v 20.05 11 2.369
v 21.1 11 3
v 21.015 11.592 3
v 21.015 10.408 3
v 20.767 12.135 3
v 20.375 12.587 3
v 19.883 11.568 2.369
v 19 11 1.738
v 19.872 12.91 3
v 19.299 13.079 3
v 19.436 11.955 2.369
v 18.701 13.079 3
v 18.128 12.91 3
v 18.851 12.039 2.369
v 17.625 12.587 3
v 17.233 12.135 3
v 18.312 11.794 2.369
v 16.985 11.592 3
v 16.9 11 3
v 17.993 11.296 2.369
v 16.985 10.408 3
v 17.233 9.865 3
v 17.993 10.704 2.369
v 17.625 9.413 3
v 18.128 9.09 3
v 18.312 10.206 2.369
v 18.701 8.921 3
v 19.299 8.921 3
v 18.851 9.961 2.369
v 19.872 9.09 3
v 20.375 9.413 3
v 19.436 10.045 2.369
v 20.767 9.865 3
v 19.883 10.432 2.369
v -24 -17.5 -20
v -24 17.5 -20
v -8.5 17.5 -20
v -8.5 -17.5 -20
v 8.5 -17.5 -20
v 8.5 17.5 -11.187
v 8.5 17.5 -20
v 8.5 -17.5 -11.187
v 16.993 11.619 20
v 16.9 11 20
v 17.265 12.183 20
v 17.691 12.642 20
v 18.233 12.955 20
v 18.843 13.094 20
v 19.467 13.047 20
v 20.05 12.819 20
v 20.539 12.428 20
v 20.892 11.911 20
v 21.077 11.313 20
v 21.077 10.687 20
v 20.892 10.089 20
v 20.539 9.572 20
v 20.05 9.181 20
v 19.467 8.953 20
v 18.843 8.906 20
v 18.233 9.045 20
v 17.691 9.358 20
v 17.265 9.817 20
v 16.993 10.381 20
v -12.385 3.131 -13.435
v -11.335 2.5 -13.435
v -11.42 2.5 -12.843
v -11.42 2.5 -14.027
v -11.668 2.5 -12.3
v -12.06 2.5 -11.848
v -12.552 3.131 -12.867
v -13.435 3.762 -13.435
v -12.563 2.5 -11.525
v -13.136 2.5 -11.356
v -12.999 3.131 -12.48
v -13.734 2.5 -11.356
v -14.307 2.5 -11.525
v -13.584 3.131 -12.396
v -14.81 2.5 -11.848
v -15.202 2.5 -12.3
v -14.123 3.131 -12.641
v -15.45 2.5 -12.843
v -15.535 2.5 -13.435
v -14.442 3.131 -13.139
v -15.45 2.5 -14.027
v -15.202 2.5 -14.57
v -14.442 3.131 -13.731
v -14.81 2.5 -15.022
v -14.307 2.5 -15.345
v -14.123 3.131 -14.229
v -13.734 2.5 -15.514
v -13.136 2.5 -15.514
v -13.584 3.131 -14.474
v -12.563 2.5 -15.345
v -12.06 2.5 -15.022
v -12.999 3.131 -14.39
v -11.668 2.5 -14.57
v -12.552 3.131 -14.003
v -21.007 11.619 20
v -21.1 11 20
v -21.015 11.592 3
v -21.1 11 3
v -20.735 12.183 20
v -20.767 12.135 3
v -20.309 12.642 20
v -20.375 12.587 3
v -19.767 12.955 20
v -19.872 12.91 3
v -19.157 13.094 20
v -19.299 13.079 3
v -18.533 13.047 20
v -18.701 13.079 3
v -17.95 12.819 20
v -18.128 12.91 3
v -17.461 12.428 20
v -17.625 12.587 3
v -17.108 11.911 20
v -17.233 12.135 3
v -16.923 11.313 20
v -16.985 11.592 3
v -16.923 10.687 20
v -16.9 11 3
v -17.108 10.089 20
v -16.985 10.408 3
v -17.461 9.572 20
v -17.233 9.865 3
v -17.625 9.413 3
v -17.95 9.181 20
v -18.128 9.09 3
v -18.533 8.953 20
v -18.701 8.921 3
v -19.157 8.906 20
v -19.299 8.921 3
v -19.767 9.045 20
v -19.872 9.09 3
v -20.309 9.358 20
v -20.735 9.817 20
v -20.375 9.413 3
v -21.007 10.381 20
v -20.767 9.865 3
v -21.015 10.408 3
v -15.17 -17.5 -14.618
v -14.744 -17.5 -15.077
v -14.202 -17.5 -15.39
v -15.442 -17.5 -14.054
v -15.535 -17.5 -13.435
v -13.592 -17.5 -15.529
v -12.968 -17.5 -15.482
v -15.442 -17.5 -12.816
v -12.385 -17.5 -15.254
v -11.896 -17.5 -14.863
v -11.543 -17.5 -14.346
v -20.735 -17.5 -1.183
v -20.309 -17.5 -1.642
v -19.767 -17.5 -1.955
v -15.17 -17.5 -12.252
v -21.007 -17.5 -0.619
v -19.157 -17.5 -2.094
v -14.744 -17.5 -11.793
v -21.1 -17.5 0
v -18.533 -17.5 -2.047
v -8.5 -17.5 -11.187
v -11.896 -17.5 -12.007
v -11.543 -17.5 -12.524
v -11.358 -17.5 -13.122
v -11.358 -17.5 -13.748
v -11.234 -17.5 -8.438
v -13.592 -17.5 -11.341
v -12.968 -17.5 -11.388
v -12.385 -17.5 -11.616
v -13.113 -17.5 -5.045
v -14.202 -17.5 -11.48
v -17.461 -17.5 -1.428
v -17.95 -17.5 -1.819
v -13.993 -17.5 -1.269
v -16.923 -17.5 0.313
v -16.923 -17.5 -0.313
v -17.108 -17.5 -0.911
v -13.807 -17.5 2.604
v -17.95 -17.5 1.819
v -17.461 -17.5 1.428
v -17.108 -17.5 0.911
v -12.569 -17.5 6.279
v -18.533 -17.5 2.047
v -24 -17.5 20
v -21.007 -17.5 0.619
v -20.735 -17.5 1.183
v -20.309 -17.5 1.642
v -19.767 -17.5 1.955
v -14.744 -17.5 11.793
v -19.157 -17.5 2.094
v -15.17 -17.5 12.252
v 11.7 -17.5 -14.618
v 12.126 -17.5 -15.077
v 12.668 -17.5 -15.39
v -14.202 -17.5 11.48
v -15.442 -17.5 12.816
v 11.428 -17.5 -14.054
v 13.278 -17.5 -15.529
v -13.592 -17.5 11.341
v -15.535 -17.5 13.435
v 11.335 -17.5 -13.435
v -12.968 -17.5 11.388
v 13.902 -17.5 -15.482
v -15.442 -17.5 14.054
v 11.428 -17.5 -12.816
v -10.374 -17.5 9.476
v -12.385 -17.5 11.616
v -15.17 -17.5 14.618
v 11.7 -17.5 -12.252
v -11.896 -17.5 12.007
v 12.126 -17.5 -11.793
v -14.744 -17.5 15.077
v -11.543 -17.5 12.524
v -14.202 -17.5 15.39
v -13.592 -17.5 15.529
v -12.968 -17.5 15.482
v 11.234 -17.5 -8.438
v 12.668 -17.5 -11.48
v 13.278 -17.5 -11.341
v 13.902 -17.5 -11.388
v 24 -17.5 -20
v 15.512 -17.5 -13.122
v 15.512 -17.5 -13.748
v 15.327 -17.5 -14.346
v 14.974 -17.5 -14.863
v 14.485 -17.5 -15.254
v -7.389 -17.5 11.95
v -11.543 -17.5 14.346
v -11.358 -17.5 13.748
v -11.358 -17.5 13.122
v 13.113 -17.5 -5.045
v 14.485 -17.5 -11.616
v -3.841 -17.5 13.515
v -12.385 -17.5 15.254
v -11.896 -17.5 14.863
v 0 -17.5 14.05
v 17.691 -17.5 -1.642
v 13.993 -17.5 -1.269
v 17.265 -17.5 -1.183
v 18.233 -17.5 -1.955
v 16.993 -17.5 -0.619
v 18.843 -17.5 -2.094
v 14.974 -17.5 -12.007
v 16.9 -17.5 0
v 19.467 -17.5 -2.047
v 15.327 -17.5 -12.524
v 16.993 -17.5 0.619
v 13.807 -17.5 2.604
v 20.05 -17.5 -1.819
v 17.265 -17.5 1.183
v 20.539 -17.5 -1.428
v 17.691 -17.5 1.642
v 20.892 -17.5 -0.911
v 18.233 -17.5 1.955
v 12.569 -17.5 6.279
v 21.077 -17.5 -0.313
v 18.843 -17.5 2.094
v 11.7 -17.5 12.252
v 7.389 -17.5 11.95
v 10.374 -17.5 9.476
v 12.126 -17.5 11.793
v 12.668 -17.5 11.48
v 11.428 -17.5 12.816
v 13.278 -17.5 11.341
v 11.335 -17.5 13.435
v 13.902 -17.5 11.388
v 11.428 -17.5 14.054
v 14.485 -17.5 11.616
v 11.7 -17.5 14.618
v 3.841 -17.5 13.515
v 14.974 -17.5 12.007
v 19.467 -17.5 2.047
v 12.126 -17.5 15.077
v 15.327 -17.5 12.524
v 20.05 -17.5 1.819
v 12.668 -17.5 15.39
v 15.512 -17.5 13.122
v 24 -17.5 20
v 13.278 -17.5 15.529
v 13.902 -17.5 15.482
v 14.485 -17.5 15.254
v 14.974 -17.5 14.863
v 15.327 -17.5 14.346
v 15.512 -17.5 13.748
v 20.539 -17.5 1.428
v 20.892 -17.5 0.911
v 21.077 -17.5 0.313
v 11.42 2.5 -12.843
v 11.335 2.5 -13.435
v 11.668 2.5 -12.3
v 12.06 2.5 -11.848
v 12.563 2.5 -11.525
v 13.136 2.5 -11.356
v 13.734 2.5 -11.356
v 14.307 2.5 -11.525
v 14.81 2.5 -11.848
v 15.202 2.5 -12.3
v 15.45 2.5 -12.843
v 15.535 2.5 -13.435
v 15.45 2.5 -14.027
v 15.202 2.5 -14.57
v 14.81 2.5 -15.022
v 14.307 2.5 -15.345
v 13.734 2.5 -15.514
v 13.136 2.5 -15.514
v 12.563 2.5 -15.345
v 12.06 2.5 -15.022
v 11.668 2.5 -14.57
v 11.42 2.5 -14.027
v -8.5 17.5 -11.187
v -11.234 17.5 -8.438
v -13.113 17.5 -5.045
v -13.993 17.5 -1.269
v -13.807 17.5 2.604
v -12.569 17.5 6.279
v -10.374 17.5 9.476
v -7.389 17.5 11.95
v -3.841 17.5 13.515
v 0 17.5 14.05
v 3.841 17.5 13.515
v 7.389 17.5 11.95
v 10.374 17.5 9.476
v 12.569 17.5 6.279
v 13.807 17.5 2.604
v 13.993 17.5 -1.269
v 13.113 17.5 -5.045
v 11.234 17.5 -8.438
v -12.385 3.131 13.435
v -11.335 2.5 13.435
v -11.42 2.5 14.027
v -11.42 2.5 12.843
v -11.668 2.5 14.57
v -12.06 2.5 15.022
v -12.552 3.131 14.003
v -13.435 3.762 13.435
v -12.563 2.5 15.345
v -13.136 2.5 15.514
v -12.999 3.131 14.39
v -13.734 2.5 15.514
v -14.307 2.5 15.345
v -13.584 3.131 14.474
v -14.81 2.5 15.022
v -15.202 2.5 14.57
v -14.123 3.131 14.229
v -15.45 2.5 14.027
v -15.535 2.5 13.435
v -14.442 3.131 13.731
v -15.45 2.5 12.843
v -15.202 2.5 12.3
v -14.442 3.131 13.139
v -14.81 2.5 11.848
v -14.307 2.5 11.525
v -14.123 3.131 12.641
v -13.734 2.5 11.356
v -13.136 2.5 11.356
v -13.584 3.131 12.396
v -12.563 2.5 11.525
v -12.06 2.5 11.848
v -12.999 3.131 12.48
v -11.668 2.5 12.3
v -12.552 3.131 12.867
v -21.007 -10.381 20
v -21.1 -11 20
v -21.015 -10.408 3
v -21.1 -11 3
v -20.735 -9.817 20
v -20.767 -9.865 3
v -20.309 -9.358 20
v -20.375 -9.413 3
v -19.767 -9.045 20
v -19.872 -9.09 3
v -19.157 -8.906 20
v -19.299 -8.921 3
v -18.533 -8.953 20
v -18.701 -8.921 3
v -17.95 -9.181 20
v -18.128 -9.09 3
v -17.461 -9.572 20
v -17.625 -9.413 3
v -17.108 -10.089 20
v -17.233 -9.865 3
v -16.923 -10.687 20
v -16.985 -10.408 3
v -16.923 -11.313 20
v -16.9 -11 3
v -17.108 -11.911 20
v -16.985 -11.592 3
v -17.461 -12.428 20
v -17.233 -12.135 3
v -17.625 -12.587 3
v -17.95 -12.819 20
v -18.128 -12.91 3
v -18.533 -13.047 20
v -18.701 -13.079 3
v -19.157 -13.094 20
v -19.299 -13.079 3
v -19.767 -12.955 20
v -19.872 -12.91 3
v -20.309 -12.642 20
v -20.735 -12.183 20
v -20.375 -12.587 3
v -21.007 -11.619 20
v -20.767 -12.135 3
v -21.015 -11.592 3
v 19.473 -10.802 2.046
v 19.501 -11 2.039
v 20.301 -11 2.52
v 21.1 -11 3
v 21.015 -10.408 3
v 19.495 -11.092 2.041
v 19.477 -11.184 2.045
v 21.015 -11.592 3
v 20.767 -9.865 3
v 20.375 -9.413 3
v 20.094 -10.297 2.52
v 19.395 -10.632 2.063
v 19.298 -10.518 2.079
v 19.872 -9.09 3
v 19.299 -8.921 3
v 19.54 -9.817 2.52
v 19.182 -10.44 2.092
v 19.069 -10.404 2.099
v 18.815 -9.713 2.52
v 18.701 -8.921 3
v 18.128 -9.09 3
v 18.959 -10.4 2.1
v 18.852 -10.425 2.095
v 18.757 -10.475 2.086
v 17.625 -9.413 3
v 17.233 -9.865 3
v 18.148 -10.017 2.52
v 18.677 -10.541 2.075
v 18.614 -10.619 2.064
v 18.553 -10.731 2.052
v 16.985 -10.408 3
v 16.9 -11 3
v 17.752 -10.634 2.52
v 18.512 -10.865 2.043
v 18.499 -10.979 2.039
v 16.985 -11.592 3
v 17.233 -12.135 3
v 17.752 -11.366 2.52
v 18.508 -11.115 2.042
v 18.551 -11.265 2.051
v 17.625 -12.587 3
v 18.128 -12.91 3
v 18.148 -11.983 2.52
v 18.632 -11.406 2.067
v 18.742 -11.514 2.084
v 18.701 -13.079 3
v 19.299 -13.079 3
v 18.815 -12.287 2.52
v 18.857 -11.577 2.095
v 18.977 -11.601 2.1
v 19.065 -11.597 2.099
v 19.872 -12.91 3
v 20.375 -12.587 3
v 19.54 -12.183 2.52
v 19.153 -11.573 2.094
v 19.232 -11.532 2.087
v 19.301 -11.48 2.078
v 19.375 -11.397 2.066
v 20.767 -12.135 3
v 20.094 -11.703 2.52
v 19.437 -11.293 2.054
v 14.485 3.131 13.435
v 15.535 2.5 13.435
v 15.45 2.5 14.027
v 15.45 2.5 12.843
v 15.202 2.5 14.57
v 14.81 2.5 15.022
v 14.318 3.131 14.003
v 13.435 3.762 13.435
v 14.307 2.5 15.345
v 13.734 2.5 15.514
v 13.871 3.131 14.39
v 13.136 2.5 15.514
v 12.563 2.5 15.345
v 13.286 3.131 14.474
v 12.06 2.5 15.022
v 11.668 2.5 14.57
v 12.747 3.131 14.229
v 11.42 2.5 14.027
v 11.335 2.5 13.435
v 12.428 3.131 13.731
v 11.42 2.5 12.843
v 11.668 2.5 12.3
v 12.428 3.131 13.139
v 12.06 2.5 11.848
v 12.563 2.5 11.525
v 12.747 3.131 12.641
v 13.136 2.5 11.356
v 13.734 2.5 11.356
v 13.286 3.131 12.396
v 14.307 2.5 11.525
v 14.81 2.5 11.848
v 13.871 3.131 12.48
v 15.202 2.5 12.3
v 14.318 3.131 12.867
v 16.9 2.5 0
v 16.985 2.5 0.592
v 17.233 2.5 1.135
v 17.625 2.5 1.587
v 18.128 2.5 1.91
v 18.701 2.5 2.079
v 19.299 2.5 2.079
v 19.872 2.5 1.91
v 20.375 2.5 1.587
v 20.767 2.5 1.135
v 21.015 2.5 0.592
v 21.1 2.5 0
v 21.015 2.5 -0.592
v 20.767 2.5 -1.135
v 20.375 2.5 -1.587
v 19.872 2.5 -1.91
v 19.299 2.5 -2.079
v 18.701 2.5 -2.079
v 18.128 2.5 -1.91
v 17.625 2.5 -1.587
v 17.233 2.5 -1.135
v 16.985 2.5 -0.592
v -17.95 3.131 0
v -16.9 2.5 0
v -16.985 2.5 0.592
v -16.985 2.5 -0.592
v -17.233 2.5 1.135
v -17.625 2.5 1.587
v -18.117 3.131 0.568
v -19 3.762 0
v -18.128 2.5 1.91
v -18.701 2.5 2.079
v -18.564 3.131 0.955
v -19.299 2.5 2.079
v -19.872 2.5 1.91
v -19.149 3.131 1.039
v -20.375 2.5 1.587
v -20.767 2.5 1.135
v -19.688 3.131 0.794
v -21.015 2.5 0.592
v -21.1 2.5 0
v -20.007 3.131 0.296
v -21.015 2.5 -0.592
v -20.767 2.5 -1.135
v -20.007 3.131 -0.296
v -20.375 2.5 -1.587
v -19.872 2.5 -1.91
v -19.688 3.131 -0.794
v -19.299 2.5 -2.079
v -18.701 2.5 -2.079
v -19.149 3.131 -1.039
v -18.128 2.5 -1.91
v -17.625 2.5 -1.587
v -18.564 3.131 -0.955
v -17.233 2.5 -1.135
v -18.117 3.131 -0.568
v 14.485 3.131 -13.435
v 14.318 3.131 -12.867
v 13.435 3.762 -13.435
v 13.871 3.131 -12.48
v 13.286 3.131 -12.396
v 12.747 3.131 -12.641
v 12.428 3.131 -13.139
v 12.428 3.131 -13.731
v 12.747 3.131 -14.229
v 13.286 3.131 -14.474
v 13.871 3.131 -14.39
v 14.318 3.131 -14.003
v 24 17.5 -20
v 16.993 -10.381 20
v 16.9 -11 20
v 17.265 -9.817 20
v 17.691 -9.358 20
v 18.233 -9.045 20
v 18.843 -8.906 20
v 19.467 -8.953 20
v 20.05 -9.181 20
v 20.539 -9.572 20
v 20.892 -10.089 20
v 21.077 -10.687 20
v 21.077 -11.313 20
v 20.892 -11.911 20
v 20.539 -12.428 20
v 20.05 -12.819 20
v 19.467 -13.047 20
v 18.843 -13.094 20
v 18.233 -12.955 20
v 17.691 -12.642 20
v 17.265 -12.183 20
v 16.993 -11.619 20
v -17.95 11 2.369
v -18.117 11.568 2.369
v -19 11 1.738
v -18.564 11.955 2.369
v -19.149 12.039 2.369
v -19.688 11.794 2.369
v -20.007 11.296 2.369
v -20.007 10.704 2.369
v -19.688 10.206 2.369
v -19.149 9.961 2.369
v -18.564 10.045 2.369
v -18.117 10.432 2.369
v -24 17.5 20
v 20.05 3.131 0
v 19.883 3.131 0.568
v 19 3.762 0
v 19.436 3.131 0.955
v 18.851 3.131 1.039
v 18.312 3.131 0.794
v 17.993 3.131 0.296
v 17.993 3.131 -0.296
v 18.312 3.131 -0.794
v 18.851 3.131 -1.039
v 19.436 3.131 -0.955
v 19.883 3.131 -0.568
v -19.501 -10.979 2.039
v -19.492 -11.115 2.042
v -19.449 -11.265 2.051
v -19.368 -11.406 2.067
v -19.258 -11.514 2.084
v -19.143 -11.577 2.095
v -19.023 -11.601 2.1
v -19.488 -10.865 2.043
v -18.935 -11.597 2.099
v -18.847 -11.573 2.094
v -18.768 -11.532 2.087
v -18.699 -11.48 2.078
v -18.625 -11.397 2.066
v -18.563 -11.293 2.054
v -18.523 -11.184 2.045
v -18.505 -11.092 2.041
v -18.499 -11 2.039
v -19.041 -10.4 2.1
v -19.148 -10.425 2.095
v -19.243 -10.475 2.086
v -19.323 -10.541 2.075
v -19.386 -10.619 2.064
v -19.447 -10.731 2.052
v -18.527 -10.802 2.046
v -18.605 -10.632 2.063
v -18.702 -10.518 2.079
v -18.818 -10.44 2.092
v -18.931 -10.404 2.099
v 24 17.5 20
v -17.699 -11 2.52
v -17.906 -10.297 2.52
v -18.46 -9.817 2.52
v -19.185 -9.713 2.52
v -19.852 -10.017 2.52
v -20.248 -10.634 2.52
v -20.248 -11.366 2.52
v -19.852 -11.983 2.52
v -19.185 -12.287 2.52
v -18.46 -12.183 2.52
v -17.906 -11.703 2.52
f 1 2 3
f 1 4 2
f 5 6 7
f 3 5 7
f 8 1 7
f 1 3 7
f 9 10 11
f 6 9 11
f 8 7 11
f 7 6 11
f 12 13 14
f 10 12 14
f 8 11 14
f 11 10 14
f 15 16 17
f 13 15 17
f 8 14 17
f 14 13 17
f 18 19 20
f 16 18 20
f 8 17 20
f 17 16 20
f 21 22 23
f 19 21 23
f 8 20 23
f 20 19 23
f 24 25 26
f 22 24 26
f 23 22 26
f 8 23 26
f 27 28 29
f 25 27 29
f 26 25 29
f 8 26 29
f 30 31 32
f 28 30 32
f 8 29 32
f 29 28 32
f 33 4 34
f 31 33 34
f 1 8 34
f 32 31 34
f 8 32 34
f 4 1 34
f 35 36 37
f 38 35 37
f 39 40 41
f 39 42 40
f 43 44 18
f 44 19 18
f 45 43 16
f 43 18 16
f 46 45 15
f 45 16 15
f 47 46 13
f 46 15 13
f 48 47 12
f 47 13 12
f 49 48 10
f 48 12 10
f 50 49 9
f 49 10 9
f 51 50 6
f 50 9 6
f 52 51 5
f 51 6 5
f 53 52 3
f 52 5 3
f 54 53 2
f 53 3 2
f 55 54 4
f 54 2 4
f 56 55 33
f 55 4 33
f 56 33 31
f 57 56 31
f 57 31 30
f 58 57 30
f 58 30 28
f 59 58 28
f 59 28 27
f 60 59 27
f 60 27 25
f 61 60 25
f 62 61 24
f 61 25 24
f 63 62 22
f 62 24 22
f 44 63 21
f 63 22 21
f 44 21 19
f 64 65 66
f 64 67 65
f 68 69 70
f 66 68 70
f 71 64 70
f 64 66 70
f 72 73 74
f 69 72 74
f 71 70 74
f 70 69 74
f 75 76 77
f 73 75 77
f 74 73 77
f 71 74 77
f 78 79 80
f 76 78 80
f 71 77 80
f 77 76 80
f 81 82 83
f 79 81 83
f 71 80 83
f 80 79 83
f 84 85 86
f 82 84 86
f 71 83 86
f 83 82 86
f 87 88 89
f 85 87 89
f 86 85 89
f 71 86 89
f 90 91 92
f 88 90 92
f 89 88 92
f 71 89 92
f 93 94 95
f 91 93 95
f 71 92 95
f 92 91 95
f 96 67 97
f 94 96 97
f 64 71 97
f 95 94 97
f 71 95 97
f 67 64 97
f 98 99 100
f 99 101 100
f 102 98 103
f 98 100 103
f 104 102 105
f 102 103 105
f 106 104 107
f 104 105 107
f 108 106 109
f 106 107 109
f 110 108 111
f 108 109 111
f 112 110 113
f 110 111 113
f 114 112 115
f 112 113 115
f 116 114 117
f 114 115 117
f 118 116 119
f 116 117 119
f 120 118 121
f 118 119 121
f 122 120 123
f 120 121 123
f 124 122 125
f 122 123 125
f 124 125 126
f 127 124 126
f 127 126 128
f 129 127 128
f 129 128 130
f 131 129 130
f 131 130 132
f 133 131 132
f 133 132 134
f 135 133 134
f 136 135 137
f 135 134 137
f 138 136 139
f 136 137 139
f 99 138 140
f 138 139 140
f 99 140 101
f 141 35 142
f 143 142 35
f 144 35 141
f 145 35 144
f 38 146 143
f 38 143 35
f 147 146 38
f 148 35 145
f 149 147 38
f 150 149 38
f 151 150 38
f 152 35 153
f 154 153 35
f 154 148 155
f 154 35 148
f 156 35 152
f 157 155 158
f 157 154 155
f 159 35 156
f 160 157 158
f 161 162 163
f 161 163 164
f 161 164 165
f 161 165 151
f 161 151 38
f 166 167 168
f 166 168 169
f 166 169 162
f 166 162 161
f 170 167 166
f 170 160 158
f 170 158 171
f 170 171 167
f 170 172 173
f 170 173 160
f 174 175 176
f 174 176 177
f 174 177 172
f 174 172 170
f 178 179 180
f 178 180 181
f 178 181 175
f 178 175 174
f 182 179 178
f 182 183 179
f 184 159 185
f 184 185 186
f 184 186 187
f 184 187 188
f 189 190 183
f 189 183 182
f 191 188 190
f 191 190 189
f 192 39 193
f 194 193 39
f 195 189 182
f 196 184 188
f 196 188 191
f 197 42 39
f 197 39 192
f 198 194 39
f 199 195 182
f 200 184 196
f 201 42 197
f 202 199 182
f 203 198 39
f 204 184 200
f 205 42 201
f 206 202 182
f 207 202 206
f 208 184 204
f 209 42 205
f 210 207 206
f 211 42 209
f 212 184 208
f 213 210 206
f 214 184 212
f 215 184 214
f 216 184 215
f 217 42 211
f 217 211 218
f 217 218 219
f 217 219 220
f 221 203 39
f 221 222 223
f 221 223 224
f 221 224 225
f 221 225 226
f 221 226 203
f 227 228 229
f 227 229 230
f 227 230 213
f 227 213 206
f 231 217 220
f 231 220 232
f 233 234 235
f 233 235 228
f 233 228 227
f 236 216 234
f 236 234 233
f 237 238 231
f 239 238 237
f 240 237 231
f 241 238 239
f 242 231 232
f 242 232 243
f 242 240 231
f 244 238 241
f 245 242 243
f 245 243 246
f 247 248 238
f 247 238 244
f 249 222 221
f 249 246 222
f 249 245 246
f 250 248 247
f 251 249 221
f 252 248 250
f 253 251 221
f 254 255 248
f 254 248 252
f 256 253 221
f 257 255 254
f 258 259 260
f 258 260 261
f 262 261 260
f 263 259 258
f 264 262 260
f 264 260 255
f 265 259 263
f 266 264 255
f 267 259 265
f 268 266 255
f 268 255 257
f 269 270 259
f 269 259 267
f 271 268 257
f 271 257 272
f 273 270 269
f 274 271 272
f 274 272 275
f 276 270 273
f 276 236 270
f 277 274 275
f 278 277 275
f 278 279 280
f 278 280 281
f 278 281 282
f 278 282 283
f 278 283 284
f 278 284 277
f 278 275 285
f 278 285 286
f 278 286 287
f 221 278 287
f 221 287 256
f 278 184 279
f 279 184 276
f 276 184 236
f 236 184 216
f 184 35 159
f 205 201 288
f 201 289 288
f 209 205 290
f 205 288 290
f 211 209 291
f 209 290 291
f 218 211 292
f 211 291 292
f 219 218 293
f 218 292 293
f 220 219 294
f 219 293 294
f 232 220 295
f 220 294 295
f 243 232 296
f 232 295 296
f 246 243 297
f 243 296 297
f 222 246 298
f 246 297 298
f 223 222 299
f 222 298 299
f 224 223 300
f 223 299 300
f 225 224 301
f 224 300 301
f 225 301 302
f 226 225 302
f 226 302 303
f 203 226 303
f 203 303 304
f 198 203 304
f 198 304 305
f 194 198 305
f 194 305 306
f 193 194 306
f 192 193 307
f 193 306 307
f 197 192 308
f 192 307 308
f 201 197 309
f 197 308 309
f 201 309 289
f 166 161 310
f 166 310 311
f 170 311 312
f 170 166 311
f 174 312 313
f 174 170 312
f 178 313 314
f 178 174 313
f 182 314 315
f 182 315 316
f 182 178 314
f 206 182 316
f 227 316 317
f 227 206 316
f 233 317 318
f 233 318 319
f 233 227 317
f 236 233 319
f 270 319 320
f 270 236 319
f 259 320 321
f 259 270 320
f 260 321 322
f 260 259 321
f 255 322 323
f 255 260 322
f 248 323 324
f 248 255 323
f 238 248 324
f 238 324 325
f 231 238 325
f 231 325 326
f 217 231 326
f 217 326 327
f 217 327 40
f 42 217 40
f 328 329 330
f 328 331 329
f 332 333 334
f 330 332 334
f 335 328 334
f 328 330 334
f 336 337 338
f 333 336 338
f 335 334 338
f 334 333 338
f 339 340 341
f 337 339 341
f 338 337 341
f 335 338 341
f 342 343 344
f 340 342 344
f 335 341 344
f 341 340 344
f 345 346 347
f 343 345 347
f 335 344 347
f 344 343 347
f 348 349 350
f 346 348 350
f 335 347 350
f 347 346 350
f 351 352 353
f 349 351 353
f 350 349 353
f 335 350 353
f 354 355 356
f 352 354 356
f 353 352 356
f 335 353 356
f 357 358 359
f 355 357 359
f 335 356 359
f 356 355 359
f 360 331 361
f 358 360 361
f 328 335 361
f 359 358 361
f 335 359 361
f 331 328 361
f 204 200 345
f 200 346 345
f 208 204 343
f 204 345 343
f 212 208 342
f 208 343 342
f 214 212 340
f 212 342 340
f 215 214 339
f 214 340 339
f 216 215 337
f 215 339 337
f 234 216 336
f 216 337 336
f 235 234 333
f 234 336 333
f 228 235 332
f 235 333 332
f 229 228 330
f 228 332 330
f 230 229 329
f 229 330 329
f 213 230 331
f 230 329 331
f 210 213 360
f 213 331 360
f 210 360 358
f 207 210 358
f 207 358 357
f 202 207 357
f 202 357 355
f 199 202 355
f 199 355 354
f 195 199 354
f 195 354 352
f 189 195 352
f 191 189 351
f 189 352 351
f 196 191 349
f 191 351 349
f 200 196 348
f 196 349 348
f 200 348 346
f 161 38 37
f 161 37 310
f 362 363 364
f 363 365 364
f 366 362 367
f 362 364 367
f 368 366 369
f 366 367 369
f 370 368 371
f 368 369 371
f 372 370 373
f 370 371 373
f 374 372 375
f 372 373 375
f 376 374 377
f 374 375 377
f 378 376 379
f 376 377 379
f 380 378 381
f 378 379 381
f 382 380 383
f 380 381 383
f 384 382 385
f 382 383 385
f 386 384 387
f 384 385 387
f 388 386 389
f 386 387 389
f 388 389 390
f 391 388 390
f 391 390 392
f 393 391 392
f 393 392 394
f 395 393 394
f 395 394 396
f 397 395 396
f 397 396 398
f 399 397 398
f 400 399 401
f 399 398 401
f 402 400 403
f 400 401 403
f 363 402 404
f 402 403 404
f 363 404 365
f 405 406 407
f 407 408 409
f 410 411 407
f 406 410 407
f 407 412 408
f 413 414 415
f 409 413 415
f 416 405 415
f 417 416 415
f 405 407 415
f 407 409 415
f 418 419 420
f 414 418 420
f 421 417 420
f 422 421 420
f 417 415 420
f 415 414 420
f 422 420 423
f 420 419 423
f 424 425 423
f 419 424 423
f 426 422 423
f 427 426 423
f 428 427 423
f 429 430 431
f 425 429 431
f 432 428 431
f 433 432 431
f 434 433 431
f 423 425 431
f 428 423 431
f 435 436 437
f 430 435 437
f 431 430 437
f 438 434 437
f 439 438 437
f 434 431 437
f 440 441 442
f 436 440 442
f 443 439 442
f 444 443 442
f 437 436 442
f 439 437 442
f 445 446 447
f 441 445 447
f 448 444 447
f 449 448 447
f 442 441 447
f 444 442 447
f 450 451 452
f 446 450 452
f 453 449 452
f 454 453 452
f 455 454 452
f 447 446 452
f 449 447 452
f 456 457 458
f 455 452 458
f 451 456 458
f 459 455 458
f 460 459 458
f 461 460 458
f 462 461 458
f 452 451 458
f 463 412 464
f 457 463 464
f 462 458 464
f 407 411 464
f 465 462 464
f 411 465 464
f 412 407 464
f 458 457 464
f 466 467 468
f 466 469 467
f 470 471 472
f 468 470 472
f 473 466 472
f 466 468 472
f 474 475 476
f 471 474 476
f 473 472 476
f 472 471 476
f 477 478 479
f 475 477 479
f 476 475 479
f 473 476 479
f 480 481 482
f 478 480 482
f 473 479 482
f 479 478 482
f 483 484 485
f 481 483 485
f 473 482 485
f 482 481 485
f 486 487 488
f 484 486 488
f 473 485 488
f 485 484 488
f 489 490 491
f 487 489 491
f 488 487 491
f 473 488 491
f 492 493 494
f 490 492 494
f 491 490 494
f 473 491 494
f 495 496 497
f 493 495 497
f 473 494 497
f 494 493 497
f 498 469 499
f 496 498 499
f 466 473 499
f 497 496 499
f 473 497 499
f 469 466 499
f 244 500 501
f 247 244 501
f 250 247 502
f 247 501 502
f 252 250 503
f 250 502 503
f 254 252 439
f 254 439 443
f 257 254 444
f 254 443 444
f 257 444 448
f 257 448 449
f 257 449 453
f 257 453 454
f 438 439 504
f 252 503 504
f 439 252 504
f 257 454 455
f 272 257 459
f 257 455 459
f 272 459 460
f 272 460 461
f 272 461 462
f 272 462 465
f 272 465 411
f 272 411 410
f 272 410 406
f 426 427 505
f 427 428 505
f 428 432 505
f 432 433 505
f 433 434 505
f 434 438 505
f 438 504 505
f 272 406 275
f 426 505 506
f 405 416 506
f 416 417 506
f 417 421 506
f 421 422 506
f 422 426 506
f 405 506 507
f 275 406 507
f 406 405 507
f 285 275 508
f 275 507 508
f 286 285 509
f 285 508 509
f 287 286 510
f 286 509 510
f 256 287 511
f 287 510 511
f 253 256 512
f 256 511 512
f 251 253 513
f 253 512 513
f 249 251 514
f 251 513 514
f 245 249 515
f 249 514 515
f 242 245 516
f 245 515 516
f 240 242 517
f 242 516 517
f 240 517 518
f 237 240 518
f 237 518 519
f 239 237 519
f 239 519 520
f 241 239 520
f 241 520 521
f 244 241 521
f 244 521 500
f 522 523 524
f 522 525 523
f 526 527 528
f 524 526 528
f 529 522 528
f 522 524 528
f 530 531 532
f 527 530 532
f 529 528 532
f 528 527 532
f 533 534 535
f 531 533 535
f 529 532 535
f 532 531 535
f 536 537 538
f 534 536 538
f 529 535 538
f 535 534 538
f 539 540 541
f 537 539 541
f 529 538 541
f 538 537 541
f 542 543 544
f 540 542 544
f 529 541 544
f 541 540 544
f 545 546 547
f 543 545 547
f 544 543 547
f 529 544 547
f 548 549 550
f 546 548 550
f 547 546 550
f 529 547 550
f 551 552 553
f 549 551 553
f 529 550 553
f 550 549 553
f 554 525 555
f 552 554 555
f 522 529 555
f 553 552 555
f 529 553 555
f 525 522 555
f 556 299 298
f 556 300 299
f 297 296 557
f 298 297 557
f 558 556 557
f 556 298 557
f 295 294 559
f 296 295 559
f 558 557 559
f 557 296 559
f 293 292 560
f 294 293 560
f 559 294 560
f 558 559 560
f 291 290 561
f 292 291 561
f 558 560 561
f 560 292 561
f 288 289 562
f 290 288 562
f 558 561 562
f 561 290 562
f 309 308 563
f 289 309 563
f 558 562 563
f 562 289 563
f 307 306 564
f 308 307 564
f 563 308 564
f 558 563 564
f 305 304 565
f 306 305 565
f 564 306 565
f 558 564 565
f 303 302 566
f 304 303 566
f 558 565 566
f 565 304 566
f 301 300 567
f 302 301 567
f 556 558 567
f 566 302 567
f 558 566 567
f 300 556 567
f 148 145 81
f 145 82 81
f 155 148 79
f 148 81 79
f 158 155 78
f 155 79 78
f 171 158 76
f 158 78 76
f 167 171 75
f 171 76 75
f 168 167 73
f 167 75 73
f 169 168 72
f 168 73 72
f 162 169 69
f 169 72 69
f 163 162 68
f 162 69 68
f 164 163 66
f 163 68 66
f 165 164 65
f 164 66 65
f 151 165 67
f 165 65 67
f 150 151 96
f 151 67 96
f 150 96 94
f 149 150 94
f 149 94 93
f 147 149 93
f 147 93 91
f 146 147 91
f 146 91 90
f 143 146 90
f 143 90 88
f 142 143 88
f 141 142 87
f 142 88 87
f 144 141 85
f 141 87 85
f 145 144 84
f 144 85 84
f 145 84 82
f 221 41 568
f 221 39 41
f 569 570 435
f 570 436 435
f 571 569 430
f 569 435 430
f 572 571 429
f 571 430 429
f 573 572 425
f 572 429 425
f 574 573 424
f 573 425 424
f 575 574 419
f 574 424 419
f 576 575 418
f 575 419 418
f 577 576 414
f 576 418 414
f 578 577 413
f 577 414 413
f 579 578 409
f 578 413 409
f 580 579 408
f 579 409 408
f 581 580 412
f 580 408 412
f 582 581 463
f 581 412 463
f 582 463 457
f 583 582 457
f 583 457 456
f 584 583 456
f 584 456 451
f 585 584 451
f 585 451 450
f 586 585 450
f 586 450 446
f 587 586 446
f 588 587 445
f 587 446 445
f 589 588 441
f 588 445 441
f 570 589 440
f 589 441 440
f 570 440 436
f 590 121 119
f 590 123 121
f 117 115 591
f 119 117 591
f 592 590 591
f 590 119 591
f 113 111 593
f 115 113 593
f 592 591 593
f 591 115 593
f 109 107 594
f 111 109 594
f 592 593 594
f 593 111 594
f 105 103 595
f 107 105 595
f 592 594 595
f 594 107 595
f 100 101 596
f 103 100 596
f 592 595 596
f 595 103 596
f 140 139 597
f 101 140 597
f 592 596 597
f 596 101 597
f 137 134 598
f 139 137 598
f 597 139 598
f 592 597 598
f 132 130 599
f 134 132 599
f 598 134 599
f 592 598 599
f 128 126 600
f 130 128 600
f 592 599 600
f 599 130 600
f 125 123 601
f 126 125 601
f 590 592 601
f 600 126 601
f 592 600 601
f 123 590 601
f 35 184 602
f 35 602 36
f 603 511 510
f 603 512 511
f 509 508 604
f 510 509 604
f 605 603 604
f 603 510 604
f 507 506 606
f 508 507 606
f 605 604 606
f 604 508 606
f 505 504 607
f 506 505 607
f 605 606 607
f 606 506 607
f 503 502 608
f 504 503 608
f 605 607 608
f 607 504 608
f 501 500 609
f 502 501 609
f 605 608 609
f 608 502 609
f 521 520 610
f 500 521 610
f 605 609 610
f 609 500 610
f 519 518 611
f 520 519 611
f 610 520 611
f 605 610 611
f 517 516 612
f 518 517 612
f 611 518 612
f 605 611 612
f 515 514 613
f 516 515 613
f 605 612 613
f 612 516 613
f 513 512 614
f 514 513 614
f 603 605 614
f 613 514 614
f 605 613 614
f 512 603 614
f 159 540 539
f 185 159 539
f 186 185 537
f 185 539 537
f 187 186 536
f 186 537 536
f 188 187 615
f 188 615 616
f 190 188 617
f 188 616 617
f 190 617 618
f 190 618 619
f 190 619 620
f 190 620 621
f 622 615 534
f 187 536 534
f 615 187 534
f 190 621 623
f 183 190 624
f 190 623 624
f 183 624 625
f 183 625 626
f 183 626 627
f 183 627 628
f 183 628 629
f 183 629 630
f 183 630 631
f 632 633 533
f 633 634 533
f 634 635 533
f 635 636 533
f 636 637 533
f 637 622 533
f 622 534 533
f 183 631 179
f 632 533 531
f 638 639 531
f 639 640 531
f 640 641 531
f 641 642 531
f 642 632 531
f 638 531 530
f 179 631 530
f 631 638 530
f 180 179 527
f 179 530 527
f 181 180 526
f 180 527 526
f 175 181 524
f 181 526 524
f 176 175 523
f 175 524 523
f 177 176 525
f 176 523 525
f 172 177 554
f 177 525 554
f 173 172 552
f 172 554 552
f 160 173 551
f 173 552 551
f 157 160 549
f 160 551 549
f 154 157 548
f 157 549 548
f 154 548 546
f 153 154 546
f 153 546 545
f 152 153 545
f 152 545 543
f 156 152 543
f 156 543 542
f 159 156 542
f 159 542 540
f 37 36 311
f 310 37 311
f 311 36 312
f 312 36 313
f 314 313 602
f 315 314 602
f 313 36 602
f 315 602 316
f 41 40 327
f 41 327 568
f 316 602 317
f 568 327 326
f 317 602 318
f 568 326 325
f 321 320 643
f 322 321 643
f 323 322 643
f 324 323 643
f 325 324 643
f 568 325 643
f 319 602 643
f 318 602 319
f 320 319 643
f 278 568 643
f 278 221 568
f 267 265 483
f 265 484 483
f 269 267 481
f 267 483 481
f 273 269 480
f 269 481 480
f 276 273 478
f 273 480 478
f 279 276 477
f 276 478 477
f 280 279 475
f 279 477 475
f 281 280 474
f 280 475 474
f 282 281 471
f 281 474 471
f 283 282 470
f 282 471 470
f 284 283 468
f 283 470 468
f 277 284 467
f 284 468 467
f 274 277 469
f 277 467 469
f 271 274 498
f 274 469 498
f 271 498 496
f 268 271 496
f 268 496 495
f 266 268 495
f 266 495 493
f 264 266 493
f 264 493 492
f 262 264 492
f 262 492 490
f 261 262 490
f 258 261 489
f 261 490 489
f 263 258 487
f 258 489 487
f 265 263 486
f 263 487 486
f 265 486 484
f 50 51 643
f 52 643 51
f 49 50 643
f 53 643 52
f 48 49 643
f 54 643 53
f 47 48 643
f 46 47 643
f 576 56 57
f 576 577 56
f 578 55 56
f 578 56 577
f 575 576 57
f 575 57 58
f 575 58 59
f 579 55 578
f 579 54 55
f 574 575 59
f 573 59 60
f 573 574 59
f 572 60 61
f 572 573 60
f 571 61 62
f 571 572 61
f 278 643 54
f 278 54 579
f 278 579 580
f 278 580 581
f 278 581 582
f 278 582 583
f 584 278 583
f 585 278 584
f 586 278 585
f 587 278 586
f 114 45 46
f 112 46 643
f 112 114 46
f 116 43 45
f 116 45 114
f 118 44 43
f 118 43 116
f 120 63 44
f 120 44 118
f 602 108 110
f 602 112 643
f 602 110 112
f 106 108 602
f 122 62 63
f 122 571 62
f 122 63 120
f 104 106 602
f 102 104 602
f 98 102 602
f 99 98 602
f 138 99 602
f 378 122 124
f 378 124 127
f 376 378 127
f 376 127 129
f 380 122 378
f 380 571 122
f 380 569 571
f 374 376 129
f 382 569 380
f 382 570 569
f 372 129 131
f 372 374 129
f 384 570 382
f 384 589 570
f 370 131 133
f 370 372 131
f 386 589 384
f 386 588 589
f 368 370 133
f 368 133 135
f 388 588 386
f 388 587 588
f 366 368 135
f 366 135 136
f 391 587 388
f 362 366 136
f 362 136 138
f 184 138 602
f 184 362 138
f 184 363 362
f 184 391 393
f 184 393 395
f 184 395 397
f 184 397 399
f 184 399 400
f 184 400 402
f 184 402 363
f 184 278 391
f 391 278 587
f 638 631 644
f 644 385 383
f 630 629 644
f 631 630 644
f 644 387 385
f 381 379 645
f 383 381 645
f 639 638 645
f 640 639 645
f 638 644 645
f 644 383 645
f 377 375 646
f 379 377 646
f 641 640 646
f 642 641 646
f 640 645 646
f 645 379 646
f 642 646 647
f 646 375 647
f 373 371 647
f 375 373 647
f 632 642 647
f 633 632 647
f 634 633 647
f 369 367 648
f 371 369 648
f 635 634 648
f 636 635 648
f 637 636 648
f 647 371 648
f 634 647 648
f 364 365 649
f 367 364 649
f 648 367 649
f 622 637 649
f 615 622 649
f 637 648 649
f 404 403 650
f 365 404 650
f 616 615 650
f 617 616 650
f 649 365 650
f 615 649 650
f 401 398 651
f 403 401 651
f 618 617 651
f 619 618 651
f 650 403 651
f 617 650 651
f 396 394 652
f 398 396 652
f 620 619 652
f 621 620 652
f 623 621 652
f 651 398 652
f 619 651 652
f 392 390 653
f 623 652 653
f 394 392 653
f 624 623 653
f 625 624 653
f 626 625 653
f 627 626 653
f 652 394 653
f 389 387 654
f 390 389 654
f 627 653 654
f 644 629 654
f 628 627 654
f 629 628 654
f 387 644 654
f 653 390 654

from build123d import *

# Parameters (mm, degrees)
F1_DEPTH = 17.5
F3_D     = 4.2
F3_DEPTH = 20
F3_TIP   = 1.2618073
F5_D     = 4.2
F5_DEPTH = 17
F5_TIP   = 1.2618073


with BuildPart() as f1:
    # F0 (on Front) → F1 (new body, symmetric)
    with BuildSketch(Plane.XZ):
        with BuildLine():
            Line((24, -20), (24, 20))
            Line((24, 20), (-24, 20))
            Line((-24, 20), (-24, -20))
            Line((-24, -20), (-8.5, -20))
            Line((-8.5, -20), (-8.5, -11.187157816))
            ThreePointArc((-8.5, -11.187157816), (0, 14.05), (8.5, -11.187157816))
            Line((8.5, -11.187157816), (8.5, -20))
            Line((8.5, -20), (24, -20))
        make_face()
    extrude(amount=F1_DEPTH, both=True)

    # F3
    with Locations(Plane.XZ.offset(17.5)):
        with Locations((-13.4350288425, 13.4350288425), (-19, 0), (-13.4350288425, -13.4350288425), (13.4350288425, -13.4350288425), (19, 0), (13.4350288425, 13.4350288425)):
            Hole(F3_D / 2, depth=F3_DEPTH)
            with Locations((0, 0, -(F3_DEPTH + F3_TIP / 2))):  # 118° drill point
                Cone(0, F3_D / 2, F3_TIP, mode=Mode.SUBTRACT)

    # F5
    with Locations(Plane.XY.offset(20)):
        with Locations((-19, 11), (-19, -11), (19, -11), (19, 11)):
            Hole(F5_D / 2, depth=F5_DEPTH)
            with Locations((0, 0, -(F5_DEPTH + F5_TIP / 2))):  # 118° drill point
                Cone(0, F5_D / 2, F5_TIP, mode=Mode.SUBTRACT)


solid = f1.part
